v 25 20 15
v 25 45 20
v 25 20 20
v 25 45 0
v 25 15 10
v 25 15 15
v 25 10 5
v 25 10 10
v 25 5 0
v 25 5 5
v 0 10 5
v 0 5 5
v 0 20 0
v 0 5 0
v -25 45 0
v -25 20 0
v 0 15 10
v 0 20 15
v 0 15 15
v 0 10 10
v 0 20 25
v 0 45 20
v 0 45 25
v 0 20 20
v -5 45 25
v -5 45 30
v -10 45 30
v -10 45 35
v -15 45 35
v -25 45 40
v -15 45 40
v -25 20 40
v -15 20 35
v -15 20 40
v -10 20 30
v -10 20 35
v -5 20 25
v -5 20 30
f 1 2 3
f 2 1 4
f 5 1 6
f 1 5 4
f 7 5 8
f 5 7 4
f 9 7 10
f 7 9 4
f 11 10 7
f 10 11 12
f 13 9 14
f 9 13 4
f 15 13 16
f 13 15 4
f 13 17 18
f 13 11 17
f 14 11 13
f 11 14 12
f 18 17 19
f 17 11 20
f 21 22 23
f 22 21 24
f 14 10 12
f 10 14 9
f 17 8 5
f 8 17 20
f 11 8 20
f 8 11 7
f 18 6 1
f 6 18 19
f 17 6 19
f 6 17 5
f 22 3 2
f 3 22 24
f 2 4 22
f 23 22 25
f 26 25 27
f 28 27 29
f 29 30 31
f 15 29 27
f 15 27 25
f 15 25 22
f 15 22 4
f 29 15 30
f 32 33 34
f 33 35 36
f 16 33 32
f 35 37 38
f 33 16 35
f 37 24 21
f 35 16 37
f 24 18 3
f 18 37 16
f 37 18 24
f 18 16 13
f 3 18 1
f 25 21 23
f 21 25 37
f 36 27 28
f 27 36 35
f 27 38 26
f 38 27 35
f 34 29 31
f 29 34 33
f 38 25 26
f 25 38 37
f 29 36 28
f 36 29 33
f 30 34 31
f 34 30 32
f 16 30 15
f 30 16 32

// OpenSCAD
nbm=4; // nombre de marches
lm=25; // largeur d'une marche
hm=5; // hauteur d'une marche
pm=25; //profondeur d'une marche
rc=15; //rayon du cylindre
rotm=15; //rotation d'une marche
for (i=[0:nbm]){
translate([0,hm*i,0]){

cube([lm,pm,hm*i],center=false);

}
}
rotate([0,0,90]){
    for (i=[0:nbm-1]){
        translate([+20,hm*i,0]){
            cube([lm,10,25+hm*i],center=false);
        }
}
}
